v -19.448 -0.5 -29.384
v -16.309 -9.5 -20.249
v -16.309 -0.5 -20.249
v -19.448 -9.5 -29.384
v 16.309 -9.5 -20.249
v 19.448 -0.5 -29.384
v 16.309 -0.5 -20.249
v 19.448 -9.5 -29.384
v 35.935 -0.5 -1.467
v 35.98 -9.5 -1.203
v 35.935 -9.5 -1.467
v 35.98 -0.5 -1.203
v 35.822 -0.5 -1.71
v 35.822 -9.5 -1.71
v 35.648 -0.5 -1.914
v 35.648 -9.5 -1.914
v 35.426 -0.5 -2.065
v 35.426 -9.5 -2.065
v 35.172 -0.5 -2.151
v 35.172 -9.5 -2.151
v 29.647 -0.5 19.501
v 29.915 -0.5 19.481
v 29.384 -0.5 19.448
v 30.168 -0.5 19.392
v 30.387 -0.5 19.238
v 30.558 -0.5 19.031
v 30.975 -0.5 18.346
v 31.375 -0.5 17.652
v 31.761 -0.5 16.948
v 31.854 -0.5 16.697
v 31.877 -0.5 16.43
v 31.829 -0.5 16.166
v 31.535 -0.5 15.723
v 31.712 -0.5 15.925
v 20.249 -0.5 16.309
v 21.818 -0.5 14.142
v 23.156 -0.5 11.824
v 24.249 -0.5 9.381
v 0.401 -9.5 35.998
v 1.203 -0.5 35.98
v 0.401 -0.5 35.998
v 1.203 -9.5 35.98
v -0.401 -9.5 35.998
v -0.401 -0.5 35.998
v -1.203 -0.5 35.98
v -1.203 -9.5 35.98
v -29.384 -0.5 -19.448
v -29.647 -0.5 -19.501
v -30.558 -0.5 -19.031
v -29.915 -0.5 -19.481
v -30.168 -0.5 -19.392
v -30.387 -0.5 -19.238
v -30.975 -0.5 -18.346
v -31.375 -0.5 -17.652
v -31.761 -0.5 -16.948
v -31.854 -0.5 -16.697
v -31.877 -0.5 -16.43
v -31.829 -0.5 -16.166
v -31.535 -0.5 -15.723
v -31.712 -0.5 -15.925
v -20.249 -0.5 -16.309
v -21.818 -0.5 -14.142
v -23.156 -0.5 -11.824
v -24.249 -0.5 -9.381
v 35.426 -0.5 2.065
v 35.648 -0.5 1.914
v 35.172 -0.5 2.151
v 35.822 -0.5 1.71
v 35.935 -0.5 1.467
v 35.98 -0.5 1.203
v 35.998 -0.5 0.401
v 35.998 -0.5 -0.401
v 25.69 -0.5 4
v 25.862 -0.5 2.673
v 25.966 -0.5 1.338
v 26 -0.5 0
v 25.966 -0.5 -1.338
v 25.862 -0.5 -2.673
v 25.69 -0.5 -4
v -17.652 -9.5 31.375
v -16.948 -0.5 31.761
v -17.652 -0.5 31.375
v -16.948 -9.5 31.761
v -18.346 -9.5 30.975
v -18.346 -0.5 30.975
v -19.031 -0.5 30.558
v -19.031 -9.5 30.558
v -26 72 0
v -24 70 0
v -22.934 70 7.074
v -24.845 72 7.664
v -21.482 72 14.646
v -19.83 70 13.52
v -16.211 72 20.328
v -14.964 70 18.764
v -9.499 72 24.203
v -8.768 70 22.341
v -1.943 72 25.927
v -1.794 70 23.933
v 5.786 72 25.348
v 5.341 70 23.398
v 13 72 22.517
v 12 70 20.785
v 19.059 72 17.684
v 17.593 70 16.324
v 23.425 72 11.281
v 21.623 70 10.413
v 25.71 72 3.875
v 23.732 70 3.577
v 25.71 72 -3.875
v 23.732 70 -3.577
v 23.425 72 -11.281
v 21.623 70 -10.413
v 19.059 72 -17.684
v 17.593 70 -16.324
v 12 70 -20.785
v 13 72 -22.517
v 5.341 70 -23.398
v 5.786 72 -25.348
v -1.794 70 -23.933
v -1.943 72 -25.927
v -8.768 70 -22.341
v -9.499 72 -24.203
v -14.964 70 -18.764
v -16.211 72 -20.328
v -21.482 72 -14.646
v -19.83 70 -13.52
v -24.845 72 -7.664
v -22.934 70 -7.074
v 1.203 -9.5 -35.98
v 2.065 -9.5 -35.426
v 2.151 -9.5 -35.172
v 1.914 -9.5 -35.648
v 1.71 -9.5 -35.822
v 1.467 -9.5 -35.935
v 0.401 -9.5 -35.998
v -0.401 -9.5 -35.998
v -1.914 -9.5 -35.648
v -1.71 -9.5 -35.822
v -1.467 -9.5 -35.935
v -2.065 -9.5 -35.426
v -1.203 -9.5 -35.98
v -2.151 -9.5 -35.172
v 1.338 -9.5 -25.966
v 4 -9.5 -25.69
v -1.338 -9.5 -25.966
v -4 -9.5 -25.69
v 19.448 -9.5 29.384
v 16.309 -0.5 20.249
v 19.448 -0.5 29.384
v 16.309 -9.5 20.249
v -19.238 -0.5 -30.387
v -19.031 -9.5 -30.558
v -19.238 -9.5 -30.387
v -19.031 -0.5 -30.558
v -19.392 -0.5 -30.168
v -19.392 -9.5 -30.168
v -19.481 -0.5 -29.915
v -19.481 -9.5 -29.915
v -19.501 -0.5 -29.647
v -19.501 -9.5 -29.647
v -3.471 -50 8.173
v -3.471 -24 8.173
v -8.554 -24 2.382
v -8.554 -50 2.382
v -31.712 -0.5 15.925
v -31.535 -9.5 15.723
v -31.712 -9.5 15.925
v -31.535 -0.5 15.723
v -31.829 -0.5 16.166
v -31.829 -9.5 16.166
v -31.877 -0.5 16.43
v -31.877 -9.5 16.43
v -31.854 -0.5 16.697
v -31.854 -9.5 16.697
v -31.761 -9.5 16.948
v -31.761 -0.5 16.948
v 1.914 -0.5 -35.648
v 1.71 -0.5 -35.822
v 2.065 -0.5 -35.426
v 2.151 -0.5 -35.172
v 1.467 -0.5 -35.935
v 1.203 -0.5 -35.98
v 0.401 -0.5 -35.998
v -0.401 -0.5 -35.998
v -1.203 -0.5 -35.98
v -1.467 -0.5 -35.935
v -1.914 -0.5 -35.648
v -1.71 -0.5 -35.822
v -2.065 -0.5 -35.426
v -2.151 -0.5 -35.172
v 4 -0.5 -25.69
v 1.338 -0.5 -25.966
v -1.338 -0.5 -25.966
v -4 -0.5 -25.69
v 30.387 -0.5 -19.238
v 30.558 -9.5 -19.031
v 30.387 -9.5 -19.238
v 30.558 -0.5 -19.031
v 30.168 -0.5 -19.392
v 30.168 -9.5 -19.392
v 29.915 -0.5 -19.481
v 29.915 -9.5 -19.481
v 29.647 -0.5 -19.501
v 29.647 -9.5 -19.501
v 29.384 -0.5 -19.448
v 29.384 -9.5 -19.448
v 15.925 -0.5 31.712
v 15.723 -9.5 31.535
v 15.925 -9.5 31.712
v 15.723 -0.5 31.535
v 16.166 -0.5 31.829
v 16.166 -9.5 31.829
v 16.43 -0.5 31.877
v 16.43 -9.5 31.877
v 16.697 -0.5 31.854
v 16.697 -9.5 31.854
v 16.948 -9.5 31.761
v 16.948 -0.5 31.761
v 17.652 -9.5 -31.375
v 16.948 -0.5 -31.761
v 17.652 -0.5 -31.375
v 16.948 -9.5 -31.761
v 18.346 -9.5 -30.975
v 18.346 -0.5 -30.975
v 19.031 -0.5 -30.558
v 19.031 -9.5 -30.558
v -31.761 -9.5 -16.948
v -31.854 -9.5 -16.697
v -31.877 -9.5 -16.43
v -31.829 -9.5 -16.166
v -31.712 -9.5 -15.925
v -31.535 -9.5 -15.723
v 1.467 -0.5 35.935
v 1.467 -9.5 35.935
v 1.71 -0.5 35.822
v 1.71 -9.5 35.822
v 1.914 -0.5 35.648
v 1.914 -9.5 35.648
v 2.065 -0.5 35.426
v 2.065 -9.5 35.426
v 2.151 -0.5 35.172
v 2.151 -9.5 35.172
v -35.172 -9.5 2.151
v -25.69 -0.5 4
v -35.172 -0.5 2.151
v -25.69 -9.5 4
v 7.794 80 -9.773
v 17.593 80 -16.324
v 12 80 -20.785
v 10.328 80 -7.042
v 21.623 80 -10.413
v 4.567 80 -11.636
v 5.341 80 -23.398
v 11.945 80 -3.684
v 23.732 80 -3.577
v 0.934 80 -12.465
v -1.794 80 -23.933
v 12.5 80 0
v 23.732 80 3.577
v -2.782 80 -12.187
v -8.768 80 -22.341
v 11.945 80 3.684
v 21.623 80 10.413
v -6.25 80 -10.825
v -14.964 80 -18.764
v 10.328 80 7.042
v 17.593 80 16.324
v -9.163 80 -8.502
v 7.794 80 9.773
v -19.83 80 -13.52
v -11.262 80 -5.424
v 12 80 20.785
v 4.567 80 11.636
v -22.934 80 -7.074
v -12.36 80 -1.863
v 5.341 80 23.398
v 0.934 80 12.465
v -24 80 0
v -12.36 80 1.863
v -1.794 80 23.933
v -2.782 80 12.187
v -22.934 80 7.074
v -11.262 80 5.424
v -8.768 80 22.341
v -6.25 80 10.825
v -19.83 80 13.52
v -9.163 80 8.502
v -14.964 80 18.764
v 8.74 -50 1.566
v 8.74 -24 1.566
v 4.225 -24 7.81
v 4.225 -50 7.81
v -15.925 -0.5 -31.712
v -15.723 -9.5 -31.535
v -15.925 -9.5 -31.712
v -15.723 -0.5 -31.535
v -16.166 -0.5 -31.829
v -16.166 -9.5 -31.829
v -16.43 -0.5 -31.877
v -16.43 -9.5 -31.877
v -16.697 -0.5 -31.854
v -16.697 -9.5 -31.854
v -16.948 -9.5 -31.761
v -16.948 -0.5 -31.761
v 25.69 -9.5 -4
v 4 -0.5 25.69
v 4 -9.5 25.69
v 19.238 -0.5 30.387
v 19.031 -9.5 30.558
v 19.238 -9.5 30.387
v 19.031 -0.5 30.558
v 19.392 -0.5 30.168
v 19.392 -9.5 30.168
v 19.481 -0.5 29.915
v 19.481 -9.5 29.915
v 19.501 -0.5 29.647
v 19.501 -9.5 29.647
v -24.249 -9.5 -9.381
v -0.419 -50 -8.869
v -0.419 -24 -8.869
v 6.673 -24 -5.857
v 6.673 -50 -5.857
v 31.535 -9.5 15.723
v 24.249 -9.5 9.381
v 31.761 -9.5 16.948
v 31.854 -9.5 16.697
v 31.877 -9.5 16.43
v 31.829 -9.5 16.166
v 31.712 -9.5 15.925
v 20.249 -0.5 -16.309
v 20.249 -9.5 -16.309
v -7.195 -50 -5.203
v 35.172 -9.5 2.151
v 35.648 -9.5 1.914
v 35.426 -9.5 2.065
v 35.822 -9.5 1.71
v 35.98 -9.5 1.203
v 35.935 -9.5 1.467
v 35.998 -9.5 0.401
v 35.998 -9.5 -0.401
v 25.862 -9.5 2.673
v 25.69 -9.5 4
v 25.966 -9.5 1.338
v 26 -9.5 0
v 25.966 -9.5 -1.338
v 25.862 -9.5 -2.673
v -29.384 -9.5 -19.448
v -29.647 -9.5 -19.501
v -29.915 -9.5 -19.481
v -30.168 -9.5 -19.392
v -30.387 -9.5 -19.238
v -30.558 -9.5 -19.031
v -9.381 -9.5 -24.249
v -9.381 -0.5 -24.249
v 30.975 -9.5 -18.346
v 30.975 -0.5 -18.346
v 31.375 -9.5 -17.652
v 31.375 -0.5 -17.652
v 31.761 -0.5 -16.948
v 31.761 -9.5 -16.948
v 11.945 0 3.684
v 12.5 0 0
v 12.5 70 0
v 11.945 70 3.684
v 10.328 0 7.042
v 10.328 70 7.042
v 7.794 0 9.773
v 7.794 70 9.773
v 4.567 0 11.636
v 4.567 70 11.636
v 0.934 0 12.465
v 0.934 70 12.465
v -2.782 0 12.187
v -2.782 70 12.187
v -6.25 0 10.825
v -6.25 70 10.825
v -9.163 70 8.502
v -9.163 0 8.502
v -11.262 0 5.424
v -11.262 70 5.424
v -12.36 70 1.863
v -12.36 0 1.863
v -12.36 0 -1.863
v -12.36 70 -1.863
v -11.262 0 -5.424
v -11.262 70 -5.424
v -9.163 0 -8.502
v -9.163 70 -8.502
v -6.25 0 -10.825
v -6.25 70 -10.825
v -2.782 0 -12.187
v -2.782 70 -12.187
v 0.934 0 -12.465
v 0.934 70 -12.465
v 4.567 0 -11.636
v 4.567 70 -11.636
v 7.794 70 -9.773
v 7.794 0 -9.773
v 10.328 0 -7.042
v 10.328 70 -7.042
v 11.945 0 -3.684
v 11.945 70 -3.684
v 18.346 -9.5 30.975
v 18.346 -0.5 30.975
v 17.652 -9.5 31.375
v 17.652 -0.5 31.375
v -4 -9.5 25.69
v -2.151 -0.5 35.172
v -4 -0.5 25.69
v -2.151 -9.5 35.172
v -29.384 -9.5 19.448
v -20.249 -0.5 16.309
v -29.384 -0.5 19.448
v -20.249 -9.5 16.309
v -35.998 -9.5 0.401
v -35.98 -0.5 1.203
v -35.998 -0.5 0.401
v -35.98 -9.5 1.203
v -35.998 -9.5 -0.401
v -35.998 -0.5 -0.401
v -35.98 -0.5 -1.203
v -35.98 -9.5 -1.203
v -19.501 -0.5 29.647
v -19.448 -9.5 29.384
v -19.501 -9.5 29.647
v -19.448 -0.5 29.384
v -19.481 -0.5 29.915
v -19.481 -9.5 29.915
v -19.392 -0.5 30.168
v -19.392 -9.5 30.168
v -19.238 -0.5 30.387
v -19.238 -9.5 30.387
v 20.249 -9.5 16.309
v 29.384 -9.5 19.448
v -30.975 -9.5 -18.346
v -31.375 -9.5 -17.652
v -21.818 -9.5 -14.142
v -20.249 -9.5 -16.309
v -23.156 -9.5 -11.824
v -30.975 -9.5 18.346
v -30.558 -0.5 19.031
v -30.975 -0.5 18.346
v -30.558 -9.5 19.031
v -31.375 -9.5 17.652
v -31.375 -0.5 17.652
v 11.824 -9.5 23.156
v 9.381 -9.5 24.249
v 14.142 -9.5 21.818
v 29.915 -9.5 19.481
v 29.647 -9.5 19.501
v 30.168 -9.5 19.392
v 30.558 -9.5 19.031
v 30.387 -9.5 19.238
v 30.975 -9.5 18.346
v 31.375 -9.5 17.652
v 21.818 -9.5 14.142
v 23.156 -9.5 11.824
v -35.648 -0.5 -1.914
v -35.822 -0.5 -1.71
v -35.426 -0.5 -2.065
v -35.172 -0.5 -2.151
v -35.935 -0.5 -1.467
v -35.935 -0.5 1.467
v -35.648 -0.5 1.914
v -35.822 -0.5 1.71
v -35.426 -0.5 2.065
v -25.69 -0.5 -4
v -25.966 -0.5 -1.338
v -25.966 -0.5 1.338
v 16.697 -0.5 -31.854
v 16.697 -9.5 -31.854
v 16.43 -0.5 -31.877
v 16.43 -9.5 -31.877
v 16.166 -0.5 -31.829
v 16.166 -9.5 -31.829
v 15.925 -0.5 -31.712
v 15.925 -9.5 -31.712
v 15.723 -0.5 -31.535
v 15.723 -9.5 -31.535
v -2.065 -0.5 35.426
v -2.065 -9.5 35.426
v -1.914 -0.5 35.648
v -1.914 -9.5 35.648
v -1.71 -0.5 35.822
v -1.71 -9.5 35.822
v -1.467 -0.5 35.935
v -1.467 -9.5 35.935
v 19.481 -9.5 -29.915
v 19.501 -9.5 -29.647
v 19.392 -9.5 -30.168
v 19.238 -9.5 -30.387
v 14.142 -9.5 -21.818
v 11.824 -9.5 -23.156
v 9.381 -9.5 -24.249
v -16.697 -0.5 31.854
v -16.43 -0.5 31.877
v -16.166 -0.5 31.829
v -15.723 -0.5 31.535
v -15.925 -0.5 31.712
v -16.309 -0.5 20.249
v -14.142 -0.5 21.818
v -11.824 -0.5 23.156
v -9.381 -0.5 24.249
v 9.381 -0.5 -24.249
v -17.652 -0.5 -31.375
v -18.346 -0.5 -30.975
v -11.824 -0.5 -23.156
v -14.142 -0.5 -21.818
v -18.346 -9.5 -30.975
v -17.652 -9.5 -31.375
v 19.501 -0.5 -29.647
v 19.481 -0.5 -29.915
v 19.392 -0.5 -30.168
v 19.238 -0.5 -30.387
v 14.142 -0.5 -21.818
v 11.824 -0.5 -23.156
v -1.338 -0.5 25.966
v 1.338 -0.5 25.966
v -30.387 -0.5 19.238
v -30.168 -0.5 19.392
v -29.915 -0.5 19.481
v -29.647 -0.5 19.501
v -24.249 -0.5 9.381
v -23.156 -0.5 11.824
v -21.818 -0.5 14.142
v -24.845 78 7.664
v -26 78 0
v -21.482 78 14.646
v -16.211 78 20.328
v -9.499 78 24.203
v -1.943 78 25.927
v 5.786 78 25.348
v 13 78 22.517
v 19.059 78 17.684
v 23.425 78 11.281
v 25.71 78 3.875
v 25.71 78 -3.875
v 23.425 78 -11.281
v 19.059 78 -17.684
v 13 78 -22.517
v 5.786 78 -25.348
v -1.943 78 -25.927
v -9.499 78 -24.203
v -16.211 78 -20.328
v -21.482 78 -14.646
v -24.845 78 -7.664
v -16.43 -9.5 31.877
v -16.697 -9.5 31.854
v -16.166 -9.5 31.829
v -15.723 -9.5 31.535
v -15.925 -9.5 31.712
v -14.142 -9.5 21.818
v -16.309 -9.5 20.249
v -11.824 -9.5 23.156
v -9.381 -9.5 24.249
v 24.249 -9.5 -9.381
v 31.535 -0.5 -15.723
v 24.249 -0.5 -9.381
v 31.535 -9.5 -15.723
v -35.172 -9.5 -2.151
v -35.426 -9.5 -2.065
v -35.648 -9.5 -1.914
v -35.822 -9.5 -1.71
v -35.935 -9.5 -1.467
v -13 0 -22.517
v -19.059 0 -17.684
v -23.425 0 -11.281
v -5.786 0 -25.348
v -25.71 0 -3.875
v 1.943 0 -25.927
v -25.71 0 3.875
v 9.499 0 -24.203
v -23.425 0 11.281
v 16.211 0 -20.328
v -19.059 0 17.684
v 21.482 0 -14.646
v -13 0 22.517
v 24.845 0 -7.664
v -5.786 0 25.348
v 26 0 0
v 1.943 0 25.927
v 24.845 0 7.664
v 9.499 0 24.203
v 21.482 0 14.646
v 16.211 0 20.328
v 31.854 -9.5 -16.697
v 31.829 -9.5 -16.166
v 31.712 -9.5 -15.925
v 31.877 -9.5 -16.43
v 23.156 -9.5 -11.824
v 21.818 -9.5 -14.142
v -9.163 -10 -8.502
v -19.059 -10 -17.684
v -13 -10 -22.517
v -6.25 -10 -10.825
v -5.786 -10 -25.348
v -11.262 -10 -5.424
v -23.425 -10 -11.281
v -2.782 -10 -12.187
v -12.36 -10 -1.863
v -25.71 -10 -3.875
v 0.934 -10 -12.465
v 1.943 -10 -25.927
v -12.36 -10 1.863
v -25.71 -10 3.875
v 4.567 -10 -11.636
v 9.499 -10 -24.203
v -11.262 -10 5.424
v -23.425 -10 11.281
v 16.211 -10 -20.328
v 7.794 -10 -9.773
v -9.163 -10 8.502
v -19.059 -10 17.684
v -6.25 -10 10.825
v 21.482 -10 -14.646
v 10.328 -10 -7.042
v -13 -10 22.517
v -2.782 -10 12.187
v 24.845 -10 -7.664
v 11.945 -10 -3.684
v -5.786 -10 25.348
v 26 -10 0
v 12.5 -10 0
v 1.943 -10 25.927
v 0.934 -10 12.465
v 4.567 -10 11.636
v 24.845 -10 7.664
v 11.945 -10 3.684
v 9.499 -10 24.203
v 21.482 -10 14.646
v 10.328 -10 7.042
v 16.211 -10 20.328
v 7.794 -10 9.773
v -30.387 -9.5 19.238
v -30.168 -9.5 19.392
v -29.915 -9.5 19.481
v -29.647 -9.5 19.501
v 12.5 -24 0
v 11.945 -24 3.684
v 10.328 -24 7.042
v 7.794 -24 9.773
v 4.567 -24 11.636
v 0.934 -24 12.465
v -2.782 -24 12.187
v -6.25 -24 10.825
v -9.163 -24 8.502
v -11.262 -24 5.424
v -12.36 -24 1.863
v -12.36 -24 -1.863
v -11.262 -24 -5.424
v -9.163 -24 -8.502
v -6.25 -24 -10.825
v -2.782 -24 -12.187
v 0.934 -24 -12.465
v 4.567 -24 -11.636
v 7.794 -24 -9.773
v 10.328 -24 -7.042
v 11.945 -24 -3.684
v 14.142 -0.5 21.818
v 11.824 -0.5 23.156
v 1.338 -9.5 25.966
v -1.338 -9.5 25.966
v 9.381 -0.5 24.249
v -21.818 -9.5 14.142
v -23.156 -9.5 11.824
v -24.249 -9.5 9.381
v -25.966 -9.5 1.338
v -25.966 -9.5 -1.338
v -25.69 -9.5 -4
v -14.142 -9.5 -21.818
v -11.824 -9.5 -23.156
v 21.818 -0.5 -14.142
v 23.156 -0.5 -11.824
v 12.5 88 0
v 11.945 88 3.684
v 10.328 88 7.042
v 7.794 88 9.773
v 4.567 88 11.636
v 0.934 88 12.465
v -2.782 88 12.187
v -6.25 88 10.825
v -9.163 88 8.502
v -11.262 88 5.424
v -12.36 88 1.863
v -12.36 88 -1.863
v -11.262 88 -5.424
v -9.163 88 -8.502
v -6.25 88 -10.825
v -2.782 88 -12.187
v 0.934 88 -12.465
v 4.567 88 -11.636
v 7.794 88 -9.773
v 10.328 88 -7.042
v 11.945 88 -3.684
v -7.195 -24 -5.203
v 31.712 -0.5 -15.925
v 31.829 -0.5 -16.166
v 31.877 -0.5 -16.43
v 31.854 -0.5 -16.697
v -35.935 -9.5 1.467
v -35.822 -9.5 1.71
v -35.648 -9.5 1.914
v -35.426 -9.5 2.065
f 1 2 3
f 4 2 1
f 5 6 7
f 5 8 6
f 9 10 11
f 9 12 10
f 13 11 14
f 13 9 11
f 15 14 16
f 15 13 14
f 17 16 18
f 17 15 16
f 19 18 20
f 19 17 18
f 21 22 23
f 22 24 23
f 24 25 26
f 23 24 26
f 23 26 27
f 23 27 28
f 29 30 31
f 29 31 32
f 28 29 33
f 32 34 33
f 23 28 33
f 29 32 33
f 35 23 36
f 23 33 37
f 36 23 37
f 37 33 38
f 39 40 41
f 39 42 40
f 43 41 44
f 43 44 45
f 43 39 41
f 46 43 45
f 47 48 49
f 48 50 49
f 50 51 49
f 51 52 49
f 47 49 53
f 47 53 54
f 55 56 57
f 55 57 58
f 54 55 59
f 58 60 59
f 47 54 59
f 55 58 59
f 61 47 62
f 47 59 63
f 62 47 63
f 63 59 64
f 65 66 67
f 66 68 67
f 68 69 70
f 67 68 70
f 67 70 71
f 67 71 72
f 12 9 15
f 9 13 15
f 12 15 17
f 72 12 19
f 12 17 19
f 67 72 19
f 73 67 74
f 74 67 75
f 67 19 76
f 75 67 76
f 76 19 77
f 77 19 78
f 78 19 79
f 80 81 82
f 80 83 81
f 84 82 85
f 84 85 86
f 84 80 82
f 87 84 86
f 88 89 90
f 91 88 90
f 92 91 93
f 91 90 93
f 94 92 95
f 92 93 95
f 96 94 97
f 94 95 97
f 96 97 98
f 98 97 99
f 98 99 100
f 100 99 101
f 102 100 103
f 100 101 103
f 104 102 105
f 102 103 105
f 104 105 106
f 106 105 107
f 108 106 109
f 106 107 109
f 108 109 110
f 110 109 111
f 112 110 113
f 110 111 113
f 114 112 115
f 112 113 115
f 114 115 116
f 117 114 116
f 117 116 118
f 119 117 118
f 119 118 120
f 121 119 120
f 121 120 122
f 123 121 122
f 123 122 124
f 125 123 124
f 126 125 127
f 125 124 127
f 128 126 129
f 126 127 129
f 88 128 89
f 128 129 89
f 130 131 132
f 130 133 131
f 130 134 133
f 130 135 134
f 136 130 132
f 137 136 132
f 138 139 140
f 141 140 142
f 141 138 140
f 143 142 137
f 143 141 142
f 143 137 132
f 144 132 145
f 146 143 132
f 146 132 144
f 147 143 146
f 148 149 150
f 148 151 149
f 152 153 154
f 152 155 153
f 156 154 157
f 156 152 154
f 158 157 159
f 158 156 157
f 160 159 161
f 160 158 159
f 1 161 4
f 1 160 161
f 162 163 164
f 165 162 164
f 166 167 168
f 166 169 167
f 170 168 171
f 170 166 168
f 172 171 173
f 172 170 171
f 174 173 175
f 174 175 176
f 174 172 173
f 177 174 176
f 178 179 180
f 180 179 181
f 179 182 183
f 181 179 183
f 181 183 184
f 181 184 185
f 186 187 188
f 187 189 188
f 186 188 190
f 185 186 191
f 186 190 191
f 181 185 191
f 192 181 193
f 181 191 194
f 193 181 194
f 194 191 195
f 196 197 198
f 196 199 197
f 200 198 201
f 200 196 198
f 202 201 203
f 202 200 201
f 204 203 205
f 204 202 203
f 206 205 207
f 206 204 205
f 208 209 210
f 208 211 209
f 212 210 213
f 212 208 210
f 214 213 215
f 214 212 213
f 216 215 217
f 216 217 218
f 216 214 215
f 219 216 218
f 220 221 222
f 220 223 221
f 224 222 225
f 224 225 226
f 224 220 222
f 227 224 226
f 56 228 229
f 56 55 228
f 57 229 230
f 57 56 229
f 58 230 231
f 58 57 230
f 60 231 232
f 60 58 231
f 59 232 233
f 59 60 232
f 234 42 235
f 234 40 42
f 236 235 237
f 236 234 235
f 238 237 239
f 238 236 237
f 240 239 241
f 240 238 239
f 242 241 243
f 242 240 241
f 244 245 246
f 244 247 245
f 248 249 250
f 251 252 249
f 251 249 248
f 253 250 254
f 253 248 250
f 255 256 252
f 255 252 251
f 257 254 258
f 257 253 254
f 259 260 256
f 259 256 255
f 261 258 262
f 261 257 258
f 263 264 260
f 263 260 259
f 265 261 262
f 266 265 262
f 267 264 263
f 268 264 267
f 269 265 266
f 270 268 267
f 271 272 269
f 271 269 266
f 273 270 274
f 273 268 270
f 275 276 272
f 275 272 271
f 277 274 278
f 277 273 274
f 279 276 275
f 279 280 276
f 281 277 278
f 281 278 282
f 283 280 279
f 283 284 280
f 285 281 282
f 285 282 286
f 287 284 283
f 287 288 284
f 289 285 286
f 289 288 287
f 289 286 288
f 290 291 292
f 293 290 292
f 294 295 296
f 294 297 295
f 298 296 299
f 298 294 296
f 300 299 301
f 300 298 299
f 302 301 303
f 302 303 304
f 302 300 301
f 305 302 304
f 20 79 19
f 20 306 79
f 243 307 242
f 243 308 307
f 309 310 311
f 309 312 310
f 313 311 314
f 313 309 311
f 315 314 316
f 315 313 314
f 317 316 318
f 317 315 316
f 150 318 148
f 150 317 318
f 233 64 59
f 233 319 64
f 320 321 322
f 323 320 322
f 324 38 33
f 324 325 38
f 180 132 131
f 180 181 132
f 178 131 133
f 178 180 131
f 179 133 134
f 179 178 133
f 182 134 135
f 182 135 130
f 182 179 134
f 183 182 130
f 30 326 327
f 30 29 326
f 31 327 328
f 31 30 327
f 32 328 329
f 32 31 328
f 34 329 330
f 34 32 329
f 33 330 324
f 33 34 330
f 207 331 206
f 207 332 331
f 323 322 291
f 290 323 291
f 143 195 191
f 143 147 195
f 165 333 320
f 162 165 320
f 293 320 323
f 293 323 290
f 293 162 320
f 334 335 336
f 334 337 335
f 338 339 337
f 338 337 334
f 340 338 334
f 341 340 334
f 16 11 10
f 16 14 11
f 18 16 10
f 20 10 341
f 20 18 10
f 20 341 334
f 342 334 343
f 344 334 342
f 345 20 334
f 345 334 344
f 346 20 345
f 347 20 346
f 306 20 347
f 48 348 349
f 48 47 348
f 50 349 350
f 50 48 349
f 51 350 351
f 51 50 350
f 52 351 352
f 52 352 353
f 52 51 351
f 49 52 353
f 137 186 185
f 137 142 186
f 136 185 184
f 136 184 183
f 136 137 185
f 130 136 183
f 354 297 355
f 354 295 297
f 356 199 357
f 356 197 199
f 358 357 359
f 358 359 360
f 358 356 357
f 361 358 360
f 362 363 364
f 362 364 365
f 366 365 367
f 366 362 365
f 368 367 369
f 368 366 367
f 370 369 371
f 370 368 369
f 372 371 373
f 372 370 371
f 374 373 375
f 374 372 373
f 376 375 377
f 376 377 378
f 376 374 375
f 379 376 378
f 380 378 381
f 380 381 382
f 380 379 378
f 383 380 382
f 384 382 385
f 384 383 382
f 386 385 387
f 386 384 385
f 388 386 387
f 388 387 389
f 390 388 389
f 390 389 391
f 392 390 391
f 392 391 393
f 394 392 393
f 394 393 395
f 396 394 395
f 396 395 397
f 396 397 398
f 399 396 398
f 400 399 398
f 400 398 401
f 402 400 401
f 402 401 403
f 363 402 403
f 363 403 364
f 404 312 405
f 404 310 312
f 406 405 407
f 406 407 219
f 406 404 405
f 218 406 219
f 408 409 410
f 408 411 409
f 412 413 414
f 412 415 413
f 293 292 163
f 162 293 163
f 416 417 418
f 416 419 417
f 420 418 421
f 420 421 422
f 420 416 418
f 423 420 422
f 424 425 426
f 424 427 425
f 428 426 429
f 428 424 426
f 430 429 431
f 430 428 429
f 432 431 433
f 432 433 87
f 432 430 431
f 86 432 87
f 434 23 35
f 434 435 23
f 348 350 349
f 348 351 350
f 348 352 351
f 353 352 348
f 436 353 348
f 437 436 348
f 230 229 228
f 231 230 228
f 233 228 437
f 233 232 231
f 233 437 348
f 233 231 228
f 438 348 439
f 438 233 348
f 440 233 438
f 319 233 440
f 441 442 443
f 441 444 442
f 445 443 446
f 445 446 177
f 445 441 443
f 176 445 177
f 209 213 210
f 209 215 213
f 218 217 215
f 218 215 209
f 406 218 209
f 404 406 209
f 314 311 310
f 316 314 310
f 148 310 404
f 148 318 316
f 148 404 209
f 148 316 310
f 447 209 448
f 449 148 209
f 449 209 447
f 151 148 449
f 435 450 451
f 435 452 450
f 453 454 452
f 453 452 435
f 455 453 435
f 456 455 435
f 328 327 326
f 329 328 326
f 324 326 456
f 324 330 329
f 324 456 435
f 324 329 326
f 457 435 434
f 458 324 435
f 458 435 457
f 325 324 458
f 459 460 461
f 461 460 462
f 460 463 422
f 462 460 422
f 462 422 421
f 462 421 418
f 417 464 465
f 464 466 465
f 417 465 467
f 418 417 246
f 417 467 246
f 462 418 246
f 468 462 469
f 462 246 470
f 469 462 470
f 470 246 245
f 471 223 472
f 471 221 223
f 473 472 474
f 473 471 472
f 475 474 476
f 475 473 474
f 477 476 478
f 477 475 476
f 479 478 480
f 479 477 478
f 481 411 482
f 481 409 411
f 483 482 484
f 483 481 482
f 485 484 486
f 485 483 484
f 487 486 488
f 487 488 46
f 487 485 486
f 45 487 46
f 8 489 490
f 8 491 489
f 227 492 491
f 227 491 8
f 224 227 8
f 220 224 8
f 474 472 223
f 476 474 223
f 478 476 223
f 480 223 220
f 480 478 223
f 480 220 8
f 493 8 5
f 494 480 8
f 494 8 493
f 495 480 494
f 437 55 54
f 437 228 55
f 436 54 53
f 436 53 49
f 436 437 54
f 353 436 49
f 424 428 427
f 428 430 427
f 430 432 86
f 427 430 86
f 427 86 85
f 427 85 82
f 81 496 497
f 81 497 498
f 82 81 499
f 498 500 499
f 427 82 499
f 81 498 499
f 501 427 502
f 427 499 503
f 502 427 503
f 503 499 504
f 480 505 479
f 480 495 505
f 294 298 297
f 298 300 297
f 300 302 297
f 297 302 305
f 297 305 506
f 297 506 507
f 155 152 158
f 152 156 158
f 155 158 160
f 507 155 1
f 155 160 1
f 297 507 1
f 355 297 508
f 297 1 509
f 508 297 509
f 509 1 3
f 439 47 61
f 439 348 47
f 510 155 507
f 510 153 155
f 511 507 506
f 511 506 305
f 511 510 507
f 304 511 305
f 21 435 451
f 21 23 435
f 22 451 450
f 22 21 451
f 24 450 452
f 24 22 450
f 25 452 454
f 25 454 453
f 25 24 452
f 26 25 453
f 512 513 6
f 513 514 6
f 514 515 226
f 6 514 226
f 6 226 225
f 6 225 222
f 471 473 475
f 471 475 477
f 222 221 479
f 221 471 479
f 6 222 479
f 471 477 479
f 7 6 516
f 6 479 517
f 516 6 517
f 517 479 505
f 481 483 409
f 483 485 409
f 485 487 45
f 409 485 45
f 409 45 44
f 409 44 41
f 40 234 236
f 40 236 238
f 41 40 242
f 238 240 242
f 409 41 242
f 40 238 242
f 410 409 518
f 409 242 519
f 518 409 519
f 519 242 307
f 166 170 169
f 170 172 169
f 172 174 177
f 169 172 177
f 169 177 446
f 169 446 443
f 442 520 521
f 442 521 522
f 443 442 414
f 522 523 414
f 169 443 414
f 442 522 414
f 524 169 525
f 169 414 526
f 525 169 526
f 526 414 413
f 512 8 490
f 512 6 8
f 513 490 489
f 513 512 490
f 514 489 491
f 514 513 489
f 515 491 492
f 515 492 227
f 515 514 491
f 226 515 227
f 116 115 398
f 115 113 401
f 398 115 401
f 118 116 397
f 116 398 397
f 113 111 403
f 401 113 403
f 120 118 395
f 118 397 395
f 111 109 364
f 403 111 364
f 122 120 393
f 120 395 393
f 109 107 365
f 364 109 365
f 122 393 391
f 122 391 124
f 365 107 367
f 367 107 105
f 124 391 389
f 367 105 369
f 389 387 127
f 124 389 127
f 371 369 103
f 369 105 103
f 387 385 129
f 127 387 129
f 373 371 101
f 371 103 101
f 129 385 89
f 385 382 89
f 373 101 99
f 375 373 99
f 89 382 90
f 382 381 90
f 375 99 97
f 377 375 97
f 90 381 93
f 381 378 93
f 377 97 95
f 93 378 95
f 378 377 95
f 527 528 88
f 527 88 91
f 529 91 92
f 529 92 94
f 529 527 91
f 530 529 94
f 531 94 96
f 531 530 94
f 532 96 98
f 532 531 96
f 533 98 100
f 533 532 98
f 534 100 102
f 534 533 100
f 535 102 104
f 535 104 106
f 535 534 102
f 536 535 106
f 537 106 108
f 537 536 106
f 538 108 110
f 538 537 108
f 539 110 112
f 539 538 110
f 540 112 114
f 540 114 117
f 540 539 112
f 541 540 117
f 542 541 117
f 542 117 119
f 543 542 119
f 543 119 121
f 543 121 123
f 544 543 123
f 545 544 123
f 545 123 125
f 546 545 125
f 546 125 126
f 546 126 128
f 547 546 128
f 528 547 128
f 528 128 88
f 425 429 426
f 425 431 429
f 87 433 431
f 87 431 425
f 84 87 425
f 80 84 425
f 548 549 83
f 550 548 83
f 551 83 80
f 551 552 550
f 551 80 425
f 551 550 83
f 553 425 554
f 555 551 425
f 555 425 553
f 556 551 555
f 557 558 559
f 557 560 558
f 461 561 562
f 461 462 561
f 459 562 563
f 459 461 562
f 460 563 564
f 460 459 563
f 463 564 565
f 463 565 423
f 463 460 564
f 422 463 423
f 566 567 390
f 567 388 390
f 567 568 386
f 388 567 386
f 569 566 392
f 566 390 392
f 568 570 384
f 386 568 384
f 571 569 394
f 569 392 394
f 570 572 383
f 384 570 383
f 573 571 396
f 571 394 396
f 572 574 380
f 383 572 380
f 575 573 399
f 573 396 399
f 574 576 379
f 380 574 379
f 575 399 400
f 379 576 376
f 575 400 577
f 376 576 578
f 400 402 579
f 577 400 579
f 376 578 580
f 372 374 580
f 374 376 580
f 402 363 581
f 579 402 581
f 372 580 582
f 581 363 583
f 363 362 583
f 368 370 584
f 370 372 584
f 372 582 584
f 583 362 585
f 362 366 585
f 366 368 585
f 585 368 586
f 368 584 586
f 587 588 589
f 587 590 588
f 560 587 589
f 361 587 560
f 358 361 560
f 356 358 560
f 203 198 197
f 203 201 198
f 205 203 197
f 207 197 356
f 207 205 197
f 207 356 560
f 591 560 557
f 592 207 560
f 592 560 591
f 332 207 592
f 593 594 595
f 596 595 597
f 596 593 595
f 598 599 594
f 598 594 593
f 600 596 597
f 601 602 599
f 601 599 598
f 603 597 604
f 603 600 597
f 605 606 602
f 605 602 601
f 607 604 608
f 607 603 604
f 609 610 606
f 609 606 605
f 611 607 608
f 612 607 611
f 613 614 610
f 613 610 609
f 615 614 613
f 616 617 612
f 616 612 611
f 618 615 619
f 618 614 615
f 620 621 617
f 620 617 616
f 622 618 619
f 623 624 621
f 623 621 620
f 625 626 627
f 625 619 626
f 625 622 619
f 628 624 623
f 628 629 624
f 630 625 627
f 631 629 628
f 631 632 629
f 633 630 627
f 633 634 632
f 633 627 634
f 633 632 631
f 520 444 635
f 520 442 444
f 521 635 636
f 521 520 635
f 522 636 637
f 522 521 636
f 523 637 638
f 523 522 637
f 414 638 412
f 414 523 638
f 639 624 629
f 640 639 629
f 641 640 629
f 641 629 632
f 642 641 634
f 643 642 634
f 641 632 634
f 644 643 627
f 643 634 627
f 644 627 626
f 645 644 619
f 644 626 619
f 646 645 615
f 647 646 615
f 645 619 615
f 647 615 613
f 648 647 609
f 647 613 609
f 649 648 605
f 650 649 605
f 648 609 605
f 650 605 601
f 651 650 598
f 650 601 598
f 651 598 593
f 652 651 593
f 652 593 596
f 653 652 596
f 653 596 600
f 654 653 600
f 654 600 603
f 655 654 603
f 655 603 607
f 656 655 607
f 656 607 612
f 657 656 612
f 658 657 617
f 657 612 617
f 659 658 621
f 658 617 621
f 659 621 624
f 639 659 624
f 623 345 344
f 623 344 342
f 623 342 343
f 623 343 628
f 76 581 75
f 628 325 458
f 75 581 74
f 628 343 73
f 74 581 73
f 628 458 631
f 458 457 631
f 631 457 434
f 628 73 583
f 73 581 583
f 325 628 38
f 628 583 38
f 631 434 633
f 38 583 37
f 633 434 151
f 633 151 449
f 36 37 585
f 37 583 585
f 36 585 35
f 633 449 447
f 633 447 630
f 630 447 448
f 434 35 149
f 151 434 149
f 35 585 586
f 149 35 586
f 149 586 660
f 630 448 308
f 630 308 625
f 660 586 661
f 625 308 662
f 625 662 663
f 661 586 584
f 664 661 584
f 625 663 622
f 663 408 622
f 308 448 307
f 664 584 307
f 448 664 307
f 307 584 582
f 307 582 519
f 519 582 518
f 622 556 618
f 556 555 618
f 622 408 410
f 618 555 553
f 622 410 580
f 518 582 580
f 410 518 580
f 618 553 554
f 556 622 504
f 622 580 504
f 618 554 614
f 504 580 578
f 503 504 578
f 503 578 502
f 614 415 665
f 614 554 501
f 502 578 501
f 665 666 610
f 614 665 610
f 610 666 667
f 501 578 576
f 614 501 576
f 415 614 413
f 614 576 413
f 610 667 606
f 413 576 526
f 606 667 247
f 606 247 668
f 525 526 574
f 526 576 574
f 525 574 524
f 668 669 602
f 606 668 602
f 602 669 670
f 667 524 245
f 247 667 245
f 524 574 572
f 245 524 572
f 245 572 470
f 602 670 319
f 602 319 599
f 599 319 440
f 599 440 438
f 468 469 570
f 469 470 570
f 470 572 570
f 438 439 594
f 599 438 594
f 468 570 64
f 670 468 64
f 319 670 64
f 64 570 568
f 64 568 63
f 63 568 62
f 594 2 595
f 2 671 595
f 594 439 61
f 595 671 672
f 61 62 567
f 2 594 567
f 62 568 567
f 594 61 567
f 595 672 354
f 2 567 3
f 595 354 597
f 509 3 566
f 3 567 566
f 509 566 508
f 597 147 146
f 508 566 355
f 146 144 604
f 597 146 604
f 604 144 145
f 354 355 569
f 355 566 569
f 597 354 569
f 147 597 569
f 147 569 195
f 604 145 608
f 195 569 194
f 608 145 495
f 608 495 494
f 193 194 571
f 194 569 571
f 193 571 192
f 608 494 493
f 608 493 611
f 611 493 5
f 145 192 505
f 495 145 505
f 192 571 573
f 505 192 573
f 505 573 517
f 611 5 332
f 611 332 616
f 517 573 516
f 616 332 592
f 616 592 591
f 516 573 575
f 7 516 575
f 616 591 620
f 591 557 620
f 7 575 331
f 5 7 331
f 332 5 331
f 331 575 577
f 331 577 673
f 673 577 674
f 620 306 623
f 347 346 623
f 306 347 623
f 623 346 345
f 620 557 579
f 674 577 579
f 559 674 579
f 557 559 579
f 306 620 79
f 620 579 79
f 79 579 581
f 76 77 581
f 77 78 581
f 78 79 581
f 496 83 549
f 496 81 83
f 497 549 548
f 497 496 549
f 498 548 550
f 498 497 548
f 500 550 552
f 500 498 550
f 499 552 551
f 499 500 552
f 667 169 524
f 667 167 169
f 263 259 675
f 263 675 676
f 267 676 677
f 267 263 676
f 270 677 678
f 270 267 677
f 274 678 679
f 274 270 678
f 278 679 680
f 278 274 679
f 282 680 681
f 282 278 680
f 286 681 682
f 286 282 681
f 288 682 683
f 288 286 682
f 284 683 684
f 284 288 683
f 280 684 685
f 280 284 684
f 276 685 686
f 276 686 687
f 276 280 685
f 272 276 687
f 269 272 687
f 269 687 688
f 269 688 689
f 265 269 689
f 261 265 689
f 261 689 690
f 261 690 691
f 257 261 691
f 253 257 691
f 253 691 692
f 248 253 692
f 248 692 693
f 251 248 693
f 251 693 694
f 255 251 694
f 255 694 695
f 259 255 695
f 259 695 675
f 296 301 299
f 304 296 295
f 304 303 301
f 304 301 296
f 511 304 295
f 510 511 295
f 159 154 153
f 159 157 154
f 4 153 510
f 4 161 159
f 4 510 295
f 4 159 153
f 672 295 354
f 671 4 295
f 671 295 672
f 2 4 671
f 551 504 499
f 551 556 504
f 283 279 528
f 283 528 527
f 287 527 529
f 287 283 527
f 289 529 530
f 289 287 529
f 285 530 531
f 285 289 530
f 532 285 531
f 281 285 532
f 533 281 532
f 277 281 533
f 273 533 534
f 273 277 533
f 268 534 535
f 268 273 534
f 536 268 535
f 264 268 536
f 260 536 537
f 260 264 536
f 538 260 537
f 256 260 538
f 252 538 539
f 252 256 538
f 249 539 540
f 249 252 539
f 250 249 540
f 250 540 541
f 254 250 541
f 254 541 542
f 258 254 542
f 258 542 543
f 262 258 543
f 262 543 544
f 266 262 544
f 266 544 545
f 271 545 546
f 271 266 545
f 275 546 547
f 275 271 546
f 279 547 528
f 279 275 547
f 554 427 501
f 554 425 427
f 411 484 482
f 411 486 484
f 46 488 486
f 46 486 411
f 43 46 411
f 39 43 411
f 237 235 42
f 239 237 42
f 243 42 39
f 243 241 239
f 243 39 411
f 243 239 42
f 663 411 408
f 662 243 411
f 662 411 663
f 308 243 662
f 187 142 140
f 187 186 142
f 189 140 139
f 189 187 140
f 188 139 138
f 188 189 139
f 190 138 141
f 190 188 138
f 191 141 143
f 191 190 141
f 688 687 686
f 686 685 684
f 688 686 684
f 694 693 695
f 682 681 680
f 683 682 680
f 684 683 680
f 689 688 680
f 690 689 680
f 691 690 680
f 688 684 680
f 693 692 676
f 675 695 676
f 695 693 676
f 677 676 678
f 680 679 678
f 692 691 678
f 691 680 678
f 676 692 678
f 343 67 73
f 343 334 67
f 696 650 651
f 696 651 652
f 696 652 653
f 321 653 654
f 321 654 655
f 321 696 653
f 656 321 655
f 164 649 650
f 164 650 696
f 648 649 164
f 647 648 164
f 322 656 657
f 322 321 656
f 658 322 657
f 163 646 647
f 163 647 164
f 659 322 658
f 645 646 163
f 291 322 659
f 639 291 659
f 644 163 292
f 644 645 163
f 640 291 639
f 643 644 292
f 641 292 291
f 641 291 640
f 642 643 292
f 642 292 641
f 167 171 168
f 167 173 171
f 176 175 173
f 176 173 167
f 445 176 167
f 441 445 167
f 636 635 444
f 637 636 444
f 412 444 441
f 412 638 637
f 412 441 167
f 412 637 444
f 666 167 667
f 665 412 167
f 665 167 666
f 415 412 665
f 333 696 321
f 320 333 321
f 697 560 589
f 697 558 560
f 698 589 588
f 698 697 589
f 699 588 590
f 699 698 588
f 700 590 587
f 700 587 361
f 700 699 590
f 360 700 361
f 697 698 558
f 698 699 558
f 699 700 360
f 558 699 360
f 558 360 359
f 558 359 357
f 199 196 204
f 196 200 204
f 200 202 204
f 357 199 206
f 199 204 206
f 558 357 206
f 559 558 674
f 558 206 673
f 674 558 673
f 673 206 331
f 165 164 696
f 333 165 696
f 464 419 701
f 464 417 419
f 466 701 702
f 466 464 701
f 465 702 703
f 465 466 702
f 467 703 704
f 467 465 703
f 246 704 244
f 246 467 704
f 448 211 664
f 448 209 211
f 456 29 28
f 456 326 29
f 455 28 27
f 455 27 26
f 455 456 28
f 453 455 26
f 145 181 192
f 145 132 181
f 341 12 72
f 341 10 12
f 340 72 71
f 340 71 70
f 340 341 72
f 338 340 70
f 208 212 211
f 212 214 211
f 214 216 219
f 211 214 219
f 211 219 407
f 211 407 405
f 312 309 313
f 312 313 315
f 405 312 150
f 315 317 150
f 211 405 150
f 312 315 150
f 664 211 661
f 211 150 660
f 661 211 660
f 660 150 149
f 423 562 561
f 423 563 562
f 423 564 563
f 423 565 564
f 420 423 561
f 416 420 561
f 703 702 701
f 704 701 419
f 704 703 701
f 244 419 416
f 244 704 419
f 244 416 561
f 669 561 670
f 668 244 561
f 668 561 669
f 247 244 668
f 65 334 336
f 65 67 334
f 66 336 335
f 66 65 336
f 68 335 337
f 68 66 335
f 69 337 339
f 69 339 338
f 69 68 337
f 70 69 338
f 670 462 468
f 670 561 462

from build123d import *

# Parameters (mm, degrees)
F0_R      = 26
F1_DEPTH  = 10
F4_DEPTH  = 4.5
F5_R      = 1
F6_COUNT  = 12
F7_R      = 12.5
F8_DEPTH  = 98
F9_DEPTH  = 14
F11_DEPTH = 26
F13_R     = 26
F14_DEPTH = 5
F15_SIZE  = 2


with BuildPart() as f1:
    # F0 (on Front) → F1 (new body)
    with BuildSketch(Plane.XZ):
        Circle(F0_R)
    extrude(amount=F1_DEPTH)

    # F3 (on mid) → F4 (join, symmetric)
    with BuildSketch(Plane.XZ.offset(5)):
        with BuildLine():
            Line((-35.9444015112, -2), (-25.6904651573, -4))
            Line((-25.6904651573, -4), (-25.6904651573, 4))
            Line((-25.6904651573, 4), (-35.9444015112, 2))
            ThreePointArc((-35.9444015112, 2), (-36, 0), (-35.9444015112, -2))
        make_face()
    extrude(amount=F4_DEPTH, both=True)

    # F5
    f5_edges = [f1.edges().sort_by_distance(p)[0] for p in [
        (-35.944402, -5, -2),
        (-35.944402, -5, 2),
    ]]
    fillet(f5_edges, radius=F5_R)


with BuildPart() as f6_1:
    # F6: instance of F1
    add(f1.part.rotate(Axis((0, 0, 0), (0, -1, 0)), 1 * 360 / F6_COUNT))


with BuildPart() as f6_2:
    # F6: instance of F1
    add(f1.part.rotate(Axis((0, 0, 0), (0, -1, 0)), 2 * 360 / F6_COUNT))


with BuildPart() as f6_3:
    # F6: instance of F1
    add(f1.part.rotate(Axis((0, 0, 0), (0, -1, 0)), 3 * 360 / F6_COUNT))


with BuildPart() as f6_4:
    # F6: instance of F1
    add(f1.part.rotate(Axis((0, 0, 0), (0, -1, 0)), 4 * 360 / F6_COUNT))


with BuildPart() as f6_5:
    # F6: instance of F1
    add(f1.part.rotate(Axis((0, 0, 0), (0, -1, 0)), 5 * 360 / F6_COUNT))


with BuildPart() as f6_6:
    # F6: instance of F1
    add(f1.part.rotate(Axis((0, 0, 0), (0, -1, 0)), 6 * 360 / F6_COUNT))


with BuildPart() as f6_7:
    # F6: instance of F1
    add(f1.part.rotate(Axis((0, 0, 0), (0, -1, 0)), 7 * 360 / F6_COUNT))


with BuildPart() as f6_8:
    # F6: instance of F1
    add(f1.part.rotate(Axis((0, 0, 0), (0, -1, 0)), 8 * 360 / F6_COUNT))


with BuildPart() as f6_9:
    # F6: instance of F1
    add(f1.part.rotate(Axis((0, 0, 0), (0, -1, 0)), 9 * 360 / F6_COUNT))


with BuildPart() as f6_10:
    # F6: instance of F1
    add(f1.part.rotate(Axis((0, 0, 0), (0, -1, 0)), 10 * 360 / F6_COUNT))


with BuildPart() as f6_11:
    # F6: instance of F1
    add(f1.part.rotate(Axis((0, 0, 0), (0, -1, 0)), 11 * 360 / F6_COUNT))


with BuildPart() as f8:
    # F7 (on face) → F8 (new body)
    with BuildSketch(Plane.XZ.offset(10)):
        Circle(F7_R)
    extrude(amount=-F8_DEPTH)


with BuildPart() as f9:
    # F9 (new): a face of the model
    f9_faces = [f8.part.faces().sort_by_distance(p)[0] for p in [
        (0, -10, 0),
    ]]
    extrude(f9_faces, amount=F9_DEPTH)

    # F10 (on face) → F11 (join)
    with BuildSketch(Plane.XZ.offset(24)):
        Polygon((8.7402150444, 1.5656130559), (4.2253893698, 7.8095190592), (-3.4712406825, 8.1726979258), (-8.5539557005, 2.3816685616), (-7.1953676071, -5.2028058067), (-0.4185209468, -8.8694612846), (6.6734805227, -5.8572315112), align=None)
    extrude(amount=F11_DEPTH)


with BuildPart() as f1_1:
    add(f1.part)

    add(f6_1.part)  # F14 merges F6_1

    add(f6_2.part)  # F14 merges F6_2

    add(f6_3.part)  # F14 merges F6_3

    add(f6_4.part)  # F14 merges F6_4

    add(f6_5.part)  # F14 merges F6_5

    add(f6_6.part)  # F14 merges F6_6

    add(f6_7.part)  # F14 merges F6_7

    add(f6_8.part)  # F14 merges F6_8

    add(f6_9.part)  # F14 merges F6_9

    add(f6_10.part)  # F14 merges F6_10

    add(f6_11.part)  # F14 merges F6_11

    add(f8.part)  # F14 merges F8

    add(f9.part)  # F14 merges F9
    # F13 (on offset) → F14 (join, symmetric)
    with BuildSketch(Plane(origin=(0, 75, 0), x_dir=(-1, 0, 0), z_dir=(0, 1, 0))):
        Circle(F13_R)
    extrude(amount=F14_DEPTH, both=True)

    # F15
    f15_edges = [f1_1.edges().sort_by_distance(p)[0] for p in [
        (26, 80, 0),
        (26, 70, 0),
    ]]
    chamfer(f15_edges, length=F15_SIZE)


solid = f1_1.part
